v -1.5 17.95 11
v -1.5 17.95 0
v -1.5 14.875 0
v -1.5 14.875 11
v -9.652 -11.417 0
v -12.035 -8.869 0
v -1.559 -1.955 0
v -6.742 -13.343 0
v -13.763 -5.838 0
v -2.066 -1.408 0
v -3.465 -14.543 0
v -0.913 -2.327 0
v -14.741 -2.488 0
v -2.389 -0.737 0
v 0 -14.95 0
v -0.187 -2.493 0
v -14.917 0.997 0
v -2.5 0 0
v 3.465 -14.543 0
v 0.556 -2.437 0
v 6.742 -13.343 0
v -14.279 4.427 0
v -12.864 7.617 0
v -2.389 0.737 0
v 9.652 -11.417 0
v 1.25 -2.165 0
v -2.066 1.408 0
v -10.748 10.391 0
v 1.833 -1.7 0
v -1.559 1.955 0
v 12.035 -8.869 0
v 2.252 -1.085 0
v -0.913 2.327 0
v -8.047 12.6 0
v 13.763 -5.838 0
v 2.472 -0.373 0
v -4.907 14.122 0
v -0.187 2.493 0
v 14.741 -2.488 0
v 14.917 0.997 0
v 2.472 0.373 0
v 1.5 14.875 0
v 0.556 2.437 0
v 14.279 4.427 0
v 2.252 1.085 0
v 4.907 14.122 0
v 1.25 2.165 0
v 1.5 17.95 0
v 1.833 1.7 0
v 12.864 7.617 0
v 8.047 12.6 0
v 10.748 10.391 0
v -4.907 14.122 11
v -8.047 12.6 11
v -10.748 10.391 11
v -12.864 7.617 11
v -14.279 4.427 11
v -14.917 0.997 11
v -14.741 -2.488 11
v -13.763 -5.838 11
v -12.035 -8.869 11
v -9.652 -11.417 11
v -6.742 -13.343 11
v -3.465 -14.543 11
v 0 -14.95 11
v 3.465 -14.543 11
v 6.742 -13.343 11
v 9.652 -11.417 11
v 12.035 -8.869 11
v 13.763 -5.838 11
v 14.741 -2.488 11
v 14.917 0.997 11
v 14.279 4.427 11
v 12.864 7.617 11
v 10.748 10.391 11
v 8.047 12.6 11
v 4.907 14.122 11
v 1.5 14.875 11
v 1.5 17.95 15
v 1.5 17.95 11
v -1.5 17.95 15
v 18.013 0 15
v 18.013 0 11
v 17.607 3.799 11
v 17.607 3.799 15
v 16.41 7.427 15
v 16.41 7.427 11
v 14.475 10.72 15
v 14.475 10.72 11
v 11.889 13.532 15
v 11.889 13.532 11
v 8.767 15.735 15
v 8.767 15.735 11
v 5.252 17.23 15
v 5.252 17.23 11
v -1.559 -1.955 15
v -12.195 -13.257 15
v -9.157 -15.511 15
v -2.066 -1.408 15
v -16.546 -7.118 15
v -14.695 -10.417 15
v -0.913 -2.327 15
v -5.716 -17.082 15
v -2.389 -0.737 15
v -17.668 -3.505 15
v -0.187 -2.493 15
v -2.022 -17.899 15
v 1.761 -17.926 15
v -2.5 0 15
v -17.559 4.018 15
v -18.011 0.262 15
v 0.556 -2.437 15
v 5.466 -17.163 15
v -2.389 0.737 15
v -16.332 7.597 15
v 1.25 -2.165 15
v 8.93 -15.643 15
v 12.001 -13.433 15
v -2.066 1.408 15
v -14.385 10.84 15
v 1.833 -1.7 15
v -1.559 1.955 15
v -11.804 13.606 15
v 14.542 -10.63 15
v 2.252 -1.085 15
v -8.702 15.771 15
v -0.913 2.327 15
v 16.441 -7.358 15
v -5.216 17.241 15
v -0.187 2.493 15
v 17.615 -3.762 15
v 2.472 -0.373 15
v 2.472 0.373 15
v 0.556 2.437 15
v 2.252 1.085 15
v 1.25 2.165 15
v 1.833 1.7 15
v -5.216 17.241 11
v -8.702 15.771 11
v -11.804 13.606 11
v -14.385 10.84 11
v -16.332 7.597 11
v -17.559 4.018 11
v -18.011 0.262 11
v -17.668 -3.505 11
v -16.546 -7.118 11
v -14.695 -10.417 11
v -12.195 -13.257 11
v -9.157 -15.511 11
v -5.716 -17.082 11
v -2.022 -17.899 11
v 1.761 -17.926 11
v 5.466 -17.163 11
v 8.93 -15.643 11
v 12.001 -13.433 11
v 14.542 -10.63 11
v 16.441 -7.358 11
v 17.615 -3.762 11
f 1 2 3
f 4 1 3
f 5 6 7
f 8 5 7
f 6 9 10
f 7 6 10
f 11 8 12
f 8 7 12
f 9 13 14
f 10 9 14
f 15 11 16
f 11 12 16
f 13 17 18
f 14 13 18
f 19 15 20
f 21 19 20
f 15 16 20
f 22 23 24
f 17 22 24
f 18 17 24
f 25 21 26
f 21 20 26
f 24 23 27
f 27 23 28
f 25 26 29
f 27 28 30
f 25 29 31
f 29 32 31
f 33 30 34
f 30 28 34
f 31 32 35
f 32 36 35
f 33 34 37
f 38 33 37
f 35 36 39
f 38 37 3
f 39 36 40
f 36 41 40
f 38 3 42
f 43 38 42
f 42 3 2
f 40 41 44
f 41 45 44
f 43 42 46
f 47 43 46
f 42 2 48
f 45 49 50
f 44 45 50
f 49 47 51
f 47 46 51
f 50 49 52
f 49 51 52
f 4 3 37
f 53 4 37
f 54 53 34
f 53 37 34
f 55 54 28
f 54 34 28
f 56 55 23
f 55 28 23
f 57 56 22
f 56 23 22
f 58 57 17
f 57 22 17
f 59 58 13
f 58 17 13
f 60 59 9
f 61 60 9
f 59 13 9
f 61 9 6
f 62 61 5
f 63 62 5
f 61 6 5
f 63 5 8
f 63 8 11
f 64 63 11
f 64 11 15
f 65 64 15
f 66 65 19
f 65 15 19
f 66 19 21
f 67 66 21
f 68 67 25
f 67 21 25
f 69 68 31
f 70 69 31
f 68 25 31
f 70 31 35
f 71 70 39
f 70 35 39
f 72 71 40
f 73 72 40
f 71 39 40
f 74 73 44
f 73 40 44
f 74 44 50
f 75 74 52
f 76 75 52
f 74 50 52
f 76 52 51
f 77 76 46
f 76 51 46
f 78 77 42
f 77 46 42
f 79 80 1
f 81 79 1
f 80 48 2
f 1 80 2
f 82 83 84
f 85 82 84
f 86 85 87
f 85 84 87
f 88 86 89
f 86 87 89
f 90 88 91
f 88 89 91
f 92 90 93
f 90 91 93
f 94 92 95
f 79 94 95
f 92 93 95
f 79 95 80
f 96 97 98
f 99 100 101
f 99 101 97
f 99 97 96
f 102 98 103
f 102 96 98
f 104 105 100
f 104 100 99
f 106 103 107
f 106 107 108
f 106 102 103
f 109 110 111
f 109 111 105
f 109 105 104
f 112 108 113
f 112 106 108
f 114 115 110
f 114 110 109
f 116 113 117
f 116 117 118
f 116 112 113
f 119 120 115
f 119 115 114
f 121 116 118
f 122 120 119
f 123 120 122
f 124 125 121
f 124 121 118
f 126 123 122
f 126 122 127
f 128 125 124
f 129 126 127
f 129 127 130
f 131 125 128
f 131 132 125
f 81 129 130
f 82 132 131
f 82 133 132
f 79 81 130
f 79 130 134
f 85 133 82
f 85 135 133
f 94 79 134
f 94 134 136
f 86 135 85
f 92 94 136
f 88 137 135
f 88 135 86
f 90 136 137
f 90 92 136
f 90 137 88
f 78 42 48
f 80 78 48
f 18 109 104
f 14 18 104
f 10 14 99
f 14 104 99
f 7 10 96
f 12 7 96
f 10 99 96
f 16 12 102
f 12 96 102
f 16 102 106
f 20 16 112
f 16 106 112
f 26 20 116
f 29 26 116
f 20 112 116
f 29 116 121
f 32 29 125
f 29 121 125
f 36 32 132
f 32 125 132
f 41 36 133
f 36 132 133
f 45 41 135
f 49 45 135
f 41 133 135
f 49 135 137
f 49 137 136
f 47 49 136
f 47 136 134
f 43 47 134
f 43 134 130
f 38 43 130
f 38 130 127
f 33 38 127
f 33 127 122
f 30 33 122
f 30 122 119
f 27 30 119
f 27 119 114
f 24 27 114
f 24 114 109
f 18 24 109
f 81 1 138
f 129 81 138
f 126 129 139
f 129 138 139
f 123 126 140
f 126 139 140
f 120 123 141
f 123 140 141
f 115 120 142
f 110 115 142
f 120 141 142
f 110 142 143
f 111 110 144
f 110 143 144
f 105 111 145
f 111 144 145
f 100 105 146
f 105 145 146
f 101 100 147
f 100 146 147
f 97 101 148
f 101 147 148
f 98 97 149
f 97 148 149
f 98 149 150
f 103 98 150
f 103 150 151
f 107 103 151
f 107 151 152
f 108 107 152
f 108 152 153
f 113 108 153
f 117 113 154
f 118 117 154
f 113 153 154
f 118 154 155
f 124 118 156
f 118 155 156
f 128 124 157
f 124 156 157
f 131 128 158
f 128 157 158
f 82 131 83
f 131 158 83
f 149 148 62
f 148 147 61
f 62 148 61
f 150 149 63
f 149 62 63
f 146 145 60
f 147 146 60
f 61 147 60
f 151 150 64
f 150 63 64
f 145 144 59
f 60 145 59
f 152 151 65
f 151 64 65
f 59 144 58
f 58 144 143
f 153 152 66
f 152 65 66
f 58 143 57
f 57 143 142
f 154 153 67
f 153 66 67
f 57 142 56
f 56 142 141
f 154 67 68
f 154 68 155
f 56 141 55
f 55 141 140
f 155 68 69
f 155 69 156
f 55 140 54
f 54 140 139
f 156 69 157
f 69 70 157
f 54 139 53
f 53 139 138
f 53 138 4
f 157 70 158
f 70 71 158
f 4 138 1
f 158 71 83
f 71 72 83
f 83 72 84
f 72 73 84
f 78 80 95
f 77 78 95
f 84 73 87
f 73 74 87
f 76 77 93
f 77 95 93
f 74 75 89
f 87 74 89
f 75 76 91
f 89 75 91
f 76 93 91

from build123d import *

# Parameters (mm, degrees)
F1_DEPTH = 11
F3_DEPTH = 4
F5_D     = 5


with BuildPart() as f1:
    # F0 (on Top) → F1 (new body)
    with BuildSketch(Plane.XY):
        with BuildLine():
            Line((-1.5, 17.95), (-1.5, 14.874559))
            ThreePointArc((-1.5, 14.874559), (0, -14.95), (1.5, 14.874559))
            Line((1.5, 14.874559), (1.5, 17.95))
            Line((1.5, 17.95), (-1.5, 17.95))
        make_face()
    extrude(amount=F1_DEPTH)

    # F2 (on face) → F3 (join)
    with BuildSketch(Plane.XY.offset(11)):
        with BuildLine():
            ThreePointArc((-1.5, 17.95), (-12.194951, -13.256533), (18.012565, 0))
            ThreePointArc((18.012565, 0), (13.256533, 12.194951), (1.5, 17.95))
            Line((1.5, 17.95), (1.5, 14.874559))
            ThreePointArc((1.5, 14.874559), (0, -14.95), (-1.5, 14.874559))
            Line((-1.5, 14.874559), (-1.5, 17.95))
        make_face()
        with BuildLine():
            Line((1.5, 14.874559), (1.5, 17.95))
            Line((1.5, 17.95), (-1.5, 17.95))
            Line((-1.5, 17.95), (-1.5, 14.874559))
            ThreePointArc((-1.5, 14.874559), (0, -14.95), (1.5, 14.874559))
        make_face()
    extrude(amount=F3_DEPTH)

    # F5 (through all)
    with Locations(Plane(origin=(0, 0, 0), x_dir=(1, 0, 0), z_dir=(0, 0, -1))):
        with Locations((0, 0)):
            Hole(F5_D / 2)


solid = f1.part
